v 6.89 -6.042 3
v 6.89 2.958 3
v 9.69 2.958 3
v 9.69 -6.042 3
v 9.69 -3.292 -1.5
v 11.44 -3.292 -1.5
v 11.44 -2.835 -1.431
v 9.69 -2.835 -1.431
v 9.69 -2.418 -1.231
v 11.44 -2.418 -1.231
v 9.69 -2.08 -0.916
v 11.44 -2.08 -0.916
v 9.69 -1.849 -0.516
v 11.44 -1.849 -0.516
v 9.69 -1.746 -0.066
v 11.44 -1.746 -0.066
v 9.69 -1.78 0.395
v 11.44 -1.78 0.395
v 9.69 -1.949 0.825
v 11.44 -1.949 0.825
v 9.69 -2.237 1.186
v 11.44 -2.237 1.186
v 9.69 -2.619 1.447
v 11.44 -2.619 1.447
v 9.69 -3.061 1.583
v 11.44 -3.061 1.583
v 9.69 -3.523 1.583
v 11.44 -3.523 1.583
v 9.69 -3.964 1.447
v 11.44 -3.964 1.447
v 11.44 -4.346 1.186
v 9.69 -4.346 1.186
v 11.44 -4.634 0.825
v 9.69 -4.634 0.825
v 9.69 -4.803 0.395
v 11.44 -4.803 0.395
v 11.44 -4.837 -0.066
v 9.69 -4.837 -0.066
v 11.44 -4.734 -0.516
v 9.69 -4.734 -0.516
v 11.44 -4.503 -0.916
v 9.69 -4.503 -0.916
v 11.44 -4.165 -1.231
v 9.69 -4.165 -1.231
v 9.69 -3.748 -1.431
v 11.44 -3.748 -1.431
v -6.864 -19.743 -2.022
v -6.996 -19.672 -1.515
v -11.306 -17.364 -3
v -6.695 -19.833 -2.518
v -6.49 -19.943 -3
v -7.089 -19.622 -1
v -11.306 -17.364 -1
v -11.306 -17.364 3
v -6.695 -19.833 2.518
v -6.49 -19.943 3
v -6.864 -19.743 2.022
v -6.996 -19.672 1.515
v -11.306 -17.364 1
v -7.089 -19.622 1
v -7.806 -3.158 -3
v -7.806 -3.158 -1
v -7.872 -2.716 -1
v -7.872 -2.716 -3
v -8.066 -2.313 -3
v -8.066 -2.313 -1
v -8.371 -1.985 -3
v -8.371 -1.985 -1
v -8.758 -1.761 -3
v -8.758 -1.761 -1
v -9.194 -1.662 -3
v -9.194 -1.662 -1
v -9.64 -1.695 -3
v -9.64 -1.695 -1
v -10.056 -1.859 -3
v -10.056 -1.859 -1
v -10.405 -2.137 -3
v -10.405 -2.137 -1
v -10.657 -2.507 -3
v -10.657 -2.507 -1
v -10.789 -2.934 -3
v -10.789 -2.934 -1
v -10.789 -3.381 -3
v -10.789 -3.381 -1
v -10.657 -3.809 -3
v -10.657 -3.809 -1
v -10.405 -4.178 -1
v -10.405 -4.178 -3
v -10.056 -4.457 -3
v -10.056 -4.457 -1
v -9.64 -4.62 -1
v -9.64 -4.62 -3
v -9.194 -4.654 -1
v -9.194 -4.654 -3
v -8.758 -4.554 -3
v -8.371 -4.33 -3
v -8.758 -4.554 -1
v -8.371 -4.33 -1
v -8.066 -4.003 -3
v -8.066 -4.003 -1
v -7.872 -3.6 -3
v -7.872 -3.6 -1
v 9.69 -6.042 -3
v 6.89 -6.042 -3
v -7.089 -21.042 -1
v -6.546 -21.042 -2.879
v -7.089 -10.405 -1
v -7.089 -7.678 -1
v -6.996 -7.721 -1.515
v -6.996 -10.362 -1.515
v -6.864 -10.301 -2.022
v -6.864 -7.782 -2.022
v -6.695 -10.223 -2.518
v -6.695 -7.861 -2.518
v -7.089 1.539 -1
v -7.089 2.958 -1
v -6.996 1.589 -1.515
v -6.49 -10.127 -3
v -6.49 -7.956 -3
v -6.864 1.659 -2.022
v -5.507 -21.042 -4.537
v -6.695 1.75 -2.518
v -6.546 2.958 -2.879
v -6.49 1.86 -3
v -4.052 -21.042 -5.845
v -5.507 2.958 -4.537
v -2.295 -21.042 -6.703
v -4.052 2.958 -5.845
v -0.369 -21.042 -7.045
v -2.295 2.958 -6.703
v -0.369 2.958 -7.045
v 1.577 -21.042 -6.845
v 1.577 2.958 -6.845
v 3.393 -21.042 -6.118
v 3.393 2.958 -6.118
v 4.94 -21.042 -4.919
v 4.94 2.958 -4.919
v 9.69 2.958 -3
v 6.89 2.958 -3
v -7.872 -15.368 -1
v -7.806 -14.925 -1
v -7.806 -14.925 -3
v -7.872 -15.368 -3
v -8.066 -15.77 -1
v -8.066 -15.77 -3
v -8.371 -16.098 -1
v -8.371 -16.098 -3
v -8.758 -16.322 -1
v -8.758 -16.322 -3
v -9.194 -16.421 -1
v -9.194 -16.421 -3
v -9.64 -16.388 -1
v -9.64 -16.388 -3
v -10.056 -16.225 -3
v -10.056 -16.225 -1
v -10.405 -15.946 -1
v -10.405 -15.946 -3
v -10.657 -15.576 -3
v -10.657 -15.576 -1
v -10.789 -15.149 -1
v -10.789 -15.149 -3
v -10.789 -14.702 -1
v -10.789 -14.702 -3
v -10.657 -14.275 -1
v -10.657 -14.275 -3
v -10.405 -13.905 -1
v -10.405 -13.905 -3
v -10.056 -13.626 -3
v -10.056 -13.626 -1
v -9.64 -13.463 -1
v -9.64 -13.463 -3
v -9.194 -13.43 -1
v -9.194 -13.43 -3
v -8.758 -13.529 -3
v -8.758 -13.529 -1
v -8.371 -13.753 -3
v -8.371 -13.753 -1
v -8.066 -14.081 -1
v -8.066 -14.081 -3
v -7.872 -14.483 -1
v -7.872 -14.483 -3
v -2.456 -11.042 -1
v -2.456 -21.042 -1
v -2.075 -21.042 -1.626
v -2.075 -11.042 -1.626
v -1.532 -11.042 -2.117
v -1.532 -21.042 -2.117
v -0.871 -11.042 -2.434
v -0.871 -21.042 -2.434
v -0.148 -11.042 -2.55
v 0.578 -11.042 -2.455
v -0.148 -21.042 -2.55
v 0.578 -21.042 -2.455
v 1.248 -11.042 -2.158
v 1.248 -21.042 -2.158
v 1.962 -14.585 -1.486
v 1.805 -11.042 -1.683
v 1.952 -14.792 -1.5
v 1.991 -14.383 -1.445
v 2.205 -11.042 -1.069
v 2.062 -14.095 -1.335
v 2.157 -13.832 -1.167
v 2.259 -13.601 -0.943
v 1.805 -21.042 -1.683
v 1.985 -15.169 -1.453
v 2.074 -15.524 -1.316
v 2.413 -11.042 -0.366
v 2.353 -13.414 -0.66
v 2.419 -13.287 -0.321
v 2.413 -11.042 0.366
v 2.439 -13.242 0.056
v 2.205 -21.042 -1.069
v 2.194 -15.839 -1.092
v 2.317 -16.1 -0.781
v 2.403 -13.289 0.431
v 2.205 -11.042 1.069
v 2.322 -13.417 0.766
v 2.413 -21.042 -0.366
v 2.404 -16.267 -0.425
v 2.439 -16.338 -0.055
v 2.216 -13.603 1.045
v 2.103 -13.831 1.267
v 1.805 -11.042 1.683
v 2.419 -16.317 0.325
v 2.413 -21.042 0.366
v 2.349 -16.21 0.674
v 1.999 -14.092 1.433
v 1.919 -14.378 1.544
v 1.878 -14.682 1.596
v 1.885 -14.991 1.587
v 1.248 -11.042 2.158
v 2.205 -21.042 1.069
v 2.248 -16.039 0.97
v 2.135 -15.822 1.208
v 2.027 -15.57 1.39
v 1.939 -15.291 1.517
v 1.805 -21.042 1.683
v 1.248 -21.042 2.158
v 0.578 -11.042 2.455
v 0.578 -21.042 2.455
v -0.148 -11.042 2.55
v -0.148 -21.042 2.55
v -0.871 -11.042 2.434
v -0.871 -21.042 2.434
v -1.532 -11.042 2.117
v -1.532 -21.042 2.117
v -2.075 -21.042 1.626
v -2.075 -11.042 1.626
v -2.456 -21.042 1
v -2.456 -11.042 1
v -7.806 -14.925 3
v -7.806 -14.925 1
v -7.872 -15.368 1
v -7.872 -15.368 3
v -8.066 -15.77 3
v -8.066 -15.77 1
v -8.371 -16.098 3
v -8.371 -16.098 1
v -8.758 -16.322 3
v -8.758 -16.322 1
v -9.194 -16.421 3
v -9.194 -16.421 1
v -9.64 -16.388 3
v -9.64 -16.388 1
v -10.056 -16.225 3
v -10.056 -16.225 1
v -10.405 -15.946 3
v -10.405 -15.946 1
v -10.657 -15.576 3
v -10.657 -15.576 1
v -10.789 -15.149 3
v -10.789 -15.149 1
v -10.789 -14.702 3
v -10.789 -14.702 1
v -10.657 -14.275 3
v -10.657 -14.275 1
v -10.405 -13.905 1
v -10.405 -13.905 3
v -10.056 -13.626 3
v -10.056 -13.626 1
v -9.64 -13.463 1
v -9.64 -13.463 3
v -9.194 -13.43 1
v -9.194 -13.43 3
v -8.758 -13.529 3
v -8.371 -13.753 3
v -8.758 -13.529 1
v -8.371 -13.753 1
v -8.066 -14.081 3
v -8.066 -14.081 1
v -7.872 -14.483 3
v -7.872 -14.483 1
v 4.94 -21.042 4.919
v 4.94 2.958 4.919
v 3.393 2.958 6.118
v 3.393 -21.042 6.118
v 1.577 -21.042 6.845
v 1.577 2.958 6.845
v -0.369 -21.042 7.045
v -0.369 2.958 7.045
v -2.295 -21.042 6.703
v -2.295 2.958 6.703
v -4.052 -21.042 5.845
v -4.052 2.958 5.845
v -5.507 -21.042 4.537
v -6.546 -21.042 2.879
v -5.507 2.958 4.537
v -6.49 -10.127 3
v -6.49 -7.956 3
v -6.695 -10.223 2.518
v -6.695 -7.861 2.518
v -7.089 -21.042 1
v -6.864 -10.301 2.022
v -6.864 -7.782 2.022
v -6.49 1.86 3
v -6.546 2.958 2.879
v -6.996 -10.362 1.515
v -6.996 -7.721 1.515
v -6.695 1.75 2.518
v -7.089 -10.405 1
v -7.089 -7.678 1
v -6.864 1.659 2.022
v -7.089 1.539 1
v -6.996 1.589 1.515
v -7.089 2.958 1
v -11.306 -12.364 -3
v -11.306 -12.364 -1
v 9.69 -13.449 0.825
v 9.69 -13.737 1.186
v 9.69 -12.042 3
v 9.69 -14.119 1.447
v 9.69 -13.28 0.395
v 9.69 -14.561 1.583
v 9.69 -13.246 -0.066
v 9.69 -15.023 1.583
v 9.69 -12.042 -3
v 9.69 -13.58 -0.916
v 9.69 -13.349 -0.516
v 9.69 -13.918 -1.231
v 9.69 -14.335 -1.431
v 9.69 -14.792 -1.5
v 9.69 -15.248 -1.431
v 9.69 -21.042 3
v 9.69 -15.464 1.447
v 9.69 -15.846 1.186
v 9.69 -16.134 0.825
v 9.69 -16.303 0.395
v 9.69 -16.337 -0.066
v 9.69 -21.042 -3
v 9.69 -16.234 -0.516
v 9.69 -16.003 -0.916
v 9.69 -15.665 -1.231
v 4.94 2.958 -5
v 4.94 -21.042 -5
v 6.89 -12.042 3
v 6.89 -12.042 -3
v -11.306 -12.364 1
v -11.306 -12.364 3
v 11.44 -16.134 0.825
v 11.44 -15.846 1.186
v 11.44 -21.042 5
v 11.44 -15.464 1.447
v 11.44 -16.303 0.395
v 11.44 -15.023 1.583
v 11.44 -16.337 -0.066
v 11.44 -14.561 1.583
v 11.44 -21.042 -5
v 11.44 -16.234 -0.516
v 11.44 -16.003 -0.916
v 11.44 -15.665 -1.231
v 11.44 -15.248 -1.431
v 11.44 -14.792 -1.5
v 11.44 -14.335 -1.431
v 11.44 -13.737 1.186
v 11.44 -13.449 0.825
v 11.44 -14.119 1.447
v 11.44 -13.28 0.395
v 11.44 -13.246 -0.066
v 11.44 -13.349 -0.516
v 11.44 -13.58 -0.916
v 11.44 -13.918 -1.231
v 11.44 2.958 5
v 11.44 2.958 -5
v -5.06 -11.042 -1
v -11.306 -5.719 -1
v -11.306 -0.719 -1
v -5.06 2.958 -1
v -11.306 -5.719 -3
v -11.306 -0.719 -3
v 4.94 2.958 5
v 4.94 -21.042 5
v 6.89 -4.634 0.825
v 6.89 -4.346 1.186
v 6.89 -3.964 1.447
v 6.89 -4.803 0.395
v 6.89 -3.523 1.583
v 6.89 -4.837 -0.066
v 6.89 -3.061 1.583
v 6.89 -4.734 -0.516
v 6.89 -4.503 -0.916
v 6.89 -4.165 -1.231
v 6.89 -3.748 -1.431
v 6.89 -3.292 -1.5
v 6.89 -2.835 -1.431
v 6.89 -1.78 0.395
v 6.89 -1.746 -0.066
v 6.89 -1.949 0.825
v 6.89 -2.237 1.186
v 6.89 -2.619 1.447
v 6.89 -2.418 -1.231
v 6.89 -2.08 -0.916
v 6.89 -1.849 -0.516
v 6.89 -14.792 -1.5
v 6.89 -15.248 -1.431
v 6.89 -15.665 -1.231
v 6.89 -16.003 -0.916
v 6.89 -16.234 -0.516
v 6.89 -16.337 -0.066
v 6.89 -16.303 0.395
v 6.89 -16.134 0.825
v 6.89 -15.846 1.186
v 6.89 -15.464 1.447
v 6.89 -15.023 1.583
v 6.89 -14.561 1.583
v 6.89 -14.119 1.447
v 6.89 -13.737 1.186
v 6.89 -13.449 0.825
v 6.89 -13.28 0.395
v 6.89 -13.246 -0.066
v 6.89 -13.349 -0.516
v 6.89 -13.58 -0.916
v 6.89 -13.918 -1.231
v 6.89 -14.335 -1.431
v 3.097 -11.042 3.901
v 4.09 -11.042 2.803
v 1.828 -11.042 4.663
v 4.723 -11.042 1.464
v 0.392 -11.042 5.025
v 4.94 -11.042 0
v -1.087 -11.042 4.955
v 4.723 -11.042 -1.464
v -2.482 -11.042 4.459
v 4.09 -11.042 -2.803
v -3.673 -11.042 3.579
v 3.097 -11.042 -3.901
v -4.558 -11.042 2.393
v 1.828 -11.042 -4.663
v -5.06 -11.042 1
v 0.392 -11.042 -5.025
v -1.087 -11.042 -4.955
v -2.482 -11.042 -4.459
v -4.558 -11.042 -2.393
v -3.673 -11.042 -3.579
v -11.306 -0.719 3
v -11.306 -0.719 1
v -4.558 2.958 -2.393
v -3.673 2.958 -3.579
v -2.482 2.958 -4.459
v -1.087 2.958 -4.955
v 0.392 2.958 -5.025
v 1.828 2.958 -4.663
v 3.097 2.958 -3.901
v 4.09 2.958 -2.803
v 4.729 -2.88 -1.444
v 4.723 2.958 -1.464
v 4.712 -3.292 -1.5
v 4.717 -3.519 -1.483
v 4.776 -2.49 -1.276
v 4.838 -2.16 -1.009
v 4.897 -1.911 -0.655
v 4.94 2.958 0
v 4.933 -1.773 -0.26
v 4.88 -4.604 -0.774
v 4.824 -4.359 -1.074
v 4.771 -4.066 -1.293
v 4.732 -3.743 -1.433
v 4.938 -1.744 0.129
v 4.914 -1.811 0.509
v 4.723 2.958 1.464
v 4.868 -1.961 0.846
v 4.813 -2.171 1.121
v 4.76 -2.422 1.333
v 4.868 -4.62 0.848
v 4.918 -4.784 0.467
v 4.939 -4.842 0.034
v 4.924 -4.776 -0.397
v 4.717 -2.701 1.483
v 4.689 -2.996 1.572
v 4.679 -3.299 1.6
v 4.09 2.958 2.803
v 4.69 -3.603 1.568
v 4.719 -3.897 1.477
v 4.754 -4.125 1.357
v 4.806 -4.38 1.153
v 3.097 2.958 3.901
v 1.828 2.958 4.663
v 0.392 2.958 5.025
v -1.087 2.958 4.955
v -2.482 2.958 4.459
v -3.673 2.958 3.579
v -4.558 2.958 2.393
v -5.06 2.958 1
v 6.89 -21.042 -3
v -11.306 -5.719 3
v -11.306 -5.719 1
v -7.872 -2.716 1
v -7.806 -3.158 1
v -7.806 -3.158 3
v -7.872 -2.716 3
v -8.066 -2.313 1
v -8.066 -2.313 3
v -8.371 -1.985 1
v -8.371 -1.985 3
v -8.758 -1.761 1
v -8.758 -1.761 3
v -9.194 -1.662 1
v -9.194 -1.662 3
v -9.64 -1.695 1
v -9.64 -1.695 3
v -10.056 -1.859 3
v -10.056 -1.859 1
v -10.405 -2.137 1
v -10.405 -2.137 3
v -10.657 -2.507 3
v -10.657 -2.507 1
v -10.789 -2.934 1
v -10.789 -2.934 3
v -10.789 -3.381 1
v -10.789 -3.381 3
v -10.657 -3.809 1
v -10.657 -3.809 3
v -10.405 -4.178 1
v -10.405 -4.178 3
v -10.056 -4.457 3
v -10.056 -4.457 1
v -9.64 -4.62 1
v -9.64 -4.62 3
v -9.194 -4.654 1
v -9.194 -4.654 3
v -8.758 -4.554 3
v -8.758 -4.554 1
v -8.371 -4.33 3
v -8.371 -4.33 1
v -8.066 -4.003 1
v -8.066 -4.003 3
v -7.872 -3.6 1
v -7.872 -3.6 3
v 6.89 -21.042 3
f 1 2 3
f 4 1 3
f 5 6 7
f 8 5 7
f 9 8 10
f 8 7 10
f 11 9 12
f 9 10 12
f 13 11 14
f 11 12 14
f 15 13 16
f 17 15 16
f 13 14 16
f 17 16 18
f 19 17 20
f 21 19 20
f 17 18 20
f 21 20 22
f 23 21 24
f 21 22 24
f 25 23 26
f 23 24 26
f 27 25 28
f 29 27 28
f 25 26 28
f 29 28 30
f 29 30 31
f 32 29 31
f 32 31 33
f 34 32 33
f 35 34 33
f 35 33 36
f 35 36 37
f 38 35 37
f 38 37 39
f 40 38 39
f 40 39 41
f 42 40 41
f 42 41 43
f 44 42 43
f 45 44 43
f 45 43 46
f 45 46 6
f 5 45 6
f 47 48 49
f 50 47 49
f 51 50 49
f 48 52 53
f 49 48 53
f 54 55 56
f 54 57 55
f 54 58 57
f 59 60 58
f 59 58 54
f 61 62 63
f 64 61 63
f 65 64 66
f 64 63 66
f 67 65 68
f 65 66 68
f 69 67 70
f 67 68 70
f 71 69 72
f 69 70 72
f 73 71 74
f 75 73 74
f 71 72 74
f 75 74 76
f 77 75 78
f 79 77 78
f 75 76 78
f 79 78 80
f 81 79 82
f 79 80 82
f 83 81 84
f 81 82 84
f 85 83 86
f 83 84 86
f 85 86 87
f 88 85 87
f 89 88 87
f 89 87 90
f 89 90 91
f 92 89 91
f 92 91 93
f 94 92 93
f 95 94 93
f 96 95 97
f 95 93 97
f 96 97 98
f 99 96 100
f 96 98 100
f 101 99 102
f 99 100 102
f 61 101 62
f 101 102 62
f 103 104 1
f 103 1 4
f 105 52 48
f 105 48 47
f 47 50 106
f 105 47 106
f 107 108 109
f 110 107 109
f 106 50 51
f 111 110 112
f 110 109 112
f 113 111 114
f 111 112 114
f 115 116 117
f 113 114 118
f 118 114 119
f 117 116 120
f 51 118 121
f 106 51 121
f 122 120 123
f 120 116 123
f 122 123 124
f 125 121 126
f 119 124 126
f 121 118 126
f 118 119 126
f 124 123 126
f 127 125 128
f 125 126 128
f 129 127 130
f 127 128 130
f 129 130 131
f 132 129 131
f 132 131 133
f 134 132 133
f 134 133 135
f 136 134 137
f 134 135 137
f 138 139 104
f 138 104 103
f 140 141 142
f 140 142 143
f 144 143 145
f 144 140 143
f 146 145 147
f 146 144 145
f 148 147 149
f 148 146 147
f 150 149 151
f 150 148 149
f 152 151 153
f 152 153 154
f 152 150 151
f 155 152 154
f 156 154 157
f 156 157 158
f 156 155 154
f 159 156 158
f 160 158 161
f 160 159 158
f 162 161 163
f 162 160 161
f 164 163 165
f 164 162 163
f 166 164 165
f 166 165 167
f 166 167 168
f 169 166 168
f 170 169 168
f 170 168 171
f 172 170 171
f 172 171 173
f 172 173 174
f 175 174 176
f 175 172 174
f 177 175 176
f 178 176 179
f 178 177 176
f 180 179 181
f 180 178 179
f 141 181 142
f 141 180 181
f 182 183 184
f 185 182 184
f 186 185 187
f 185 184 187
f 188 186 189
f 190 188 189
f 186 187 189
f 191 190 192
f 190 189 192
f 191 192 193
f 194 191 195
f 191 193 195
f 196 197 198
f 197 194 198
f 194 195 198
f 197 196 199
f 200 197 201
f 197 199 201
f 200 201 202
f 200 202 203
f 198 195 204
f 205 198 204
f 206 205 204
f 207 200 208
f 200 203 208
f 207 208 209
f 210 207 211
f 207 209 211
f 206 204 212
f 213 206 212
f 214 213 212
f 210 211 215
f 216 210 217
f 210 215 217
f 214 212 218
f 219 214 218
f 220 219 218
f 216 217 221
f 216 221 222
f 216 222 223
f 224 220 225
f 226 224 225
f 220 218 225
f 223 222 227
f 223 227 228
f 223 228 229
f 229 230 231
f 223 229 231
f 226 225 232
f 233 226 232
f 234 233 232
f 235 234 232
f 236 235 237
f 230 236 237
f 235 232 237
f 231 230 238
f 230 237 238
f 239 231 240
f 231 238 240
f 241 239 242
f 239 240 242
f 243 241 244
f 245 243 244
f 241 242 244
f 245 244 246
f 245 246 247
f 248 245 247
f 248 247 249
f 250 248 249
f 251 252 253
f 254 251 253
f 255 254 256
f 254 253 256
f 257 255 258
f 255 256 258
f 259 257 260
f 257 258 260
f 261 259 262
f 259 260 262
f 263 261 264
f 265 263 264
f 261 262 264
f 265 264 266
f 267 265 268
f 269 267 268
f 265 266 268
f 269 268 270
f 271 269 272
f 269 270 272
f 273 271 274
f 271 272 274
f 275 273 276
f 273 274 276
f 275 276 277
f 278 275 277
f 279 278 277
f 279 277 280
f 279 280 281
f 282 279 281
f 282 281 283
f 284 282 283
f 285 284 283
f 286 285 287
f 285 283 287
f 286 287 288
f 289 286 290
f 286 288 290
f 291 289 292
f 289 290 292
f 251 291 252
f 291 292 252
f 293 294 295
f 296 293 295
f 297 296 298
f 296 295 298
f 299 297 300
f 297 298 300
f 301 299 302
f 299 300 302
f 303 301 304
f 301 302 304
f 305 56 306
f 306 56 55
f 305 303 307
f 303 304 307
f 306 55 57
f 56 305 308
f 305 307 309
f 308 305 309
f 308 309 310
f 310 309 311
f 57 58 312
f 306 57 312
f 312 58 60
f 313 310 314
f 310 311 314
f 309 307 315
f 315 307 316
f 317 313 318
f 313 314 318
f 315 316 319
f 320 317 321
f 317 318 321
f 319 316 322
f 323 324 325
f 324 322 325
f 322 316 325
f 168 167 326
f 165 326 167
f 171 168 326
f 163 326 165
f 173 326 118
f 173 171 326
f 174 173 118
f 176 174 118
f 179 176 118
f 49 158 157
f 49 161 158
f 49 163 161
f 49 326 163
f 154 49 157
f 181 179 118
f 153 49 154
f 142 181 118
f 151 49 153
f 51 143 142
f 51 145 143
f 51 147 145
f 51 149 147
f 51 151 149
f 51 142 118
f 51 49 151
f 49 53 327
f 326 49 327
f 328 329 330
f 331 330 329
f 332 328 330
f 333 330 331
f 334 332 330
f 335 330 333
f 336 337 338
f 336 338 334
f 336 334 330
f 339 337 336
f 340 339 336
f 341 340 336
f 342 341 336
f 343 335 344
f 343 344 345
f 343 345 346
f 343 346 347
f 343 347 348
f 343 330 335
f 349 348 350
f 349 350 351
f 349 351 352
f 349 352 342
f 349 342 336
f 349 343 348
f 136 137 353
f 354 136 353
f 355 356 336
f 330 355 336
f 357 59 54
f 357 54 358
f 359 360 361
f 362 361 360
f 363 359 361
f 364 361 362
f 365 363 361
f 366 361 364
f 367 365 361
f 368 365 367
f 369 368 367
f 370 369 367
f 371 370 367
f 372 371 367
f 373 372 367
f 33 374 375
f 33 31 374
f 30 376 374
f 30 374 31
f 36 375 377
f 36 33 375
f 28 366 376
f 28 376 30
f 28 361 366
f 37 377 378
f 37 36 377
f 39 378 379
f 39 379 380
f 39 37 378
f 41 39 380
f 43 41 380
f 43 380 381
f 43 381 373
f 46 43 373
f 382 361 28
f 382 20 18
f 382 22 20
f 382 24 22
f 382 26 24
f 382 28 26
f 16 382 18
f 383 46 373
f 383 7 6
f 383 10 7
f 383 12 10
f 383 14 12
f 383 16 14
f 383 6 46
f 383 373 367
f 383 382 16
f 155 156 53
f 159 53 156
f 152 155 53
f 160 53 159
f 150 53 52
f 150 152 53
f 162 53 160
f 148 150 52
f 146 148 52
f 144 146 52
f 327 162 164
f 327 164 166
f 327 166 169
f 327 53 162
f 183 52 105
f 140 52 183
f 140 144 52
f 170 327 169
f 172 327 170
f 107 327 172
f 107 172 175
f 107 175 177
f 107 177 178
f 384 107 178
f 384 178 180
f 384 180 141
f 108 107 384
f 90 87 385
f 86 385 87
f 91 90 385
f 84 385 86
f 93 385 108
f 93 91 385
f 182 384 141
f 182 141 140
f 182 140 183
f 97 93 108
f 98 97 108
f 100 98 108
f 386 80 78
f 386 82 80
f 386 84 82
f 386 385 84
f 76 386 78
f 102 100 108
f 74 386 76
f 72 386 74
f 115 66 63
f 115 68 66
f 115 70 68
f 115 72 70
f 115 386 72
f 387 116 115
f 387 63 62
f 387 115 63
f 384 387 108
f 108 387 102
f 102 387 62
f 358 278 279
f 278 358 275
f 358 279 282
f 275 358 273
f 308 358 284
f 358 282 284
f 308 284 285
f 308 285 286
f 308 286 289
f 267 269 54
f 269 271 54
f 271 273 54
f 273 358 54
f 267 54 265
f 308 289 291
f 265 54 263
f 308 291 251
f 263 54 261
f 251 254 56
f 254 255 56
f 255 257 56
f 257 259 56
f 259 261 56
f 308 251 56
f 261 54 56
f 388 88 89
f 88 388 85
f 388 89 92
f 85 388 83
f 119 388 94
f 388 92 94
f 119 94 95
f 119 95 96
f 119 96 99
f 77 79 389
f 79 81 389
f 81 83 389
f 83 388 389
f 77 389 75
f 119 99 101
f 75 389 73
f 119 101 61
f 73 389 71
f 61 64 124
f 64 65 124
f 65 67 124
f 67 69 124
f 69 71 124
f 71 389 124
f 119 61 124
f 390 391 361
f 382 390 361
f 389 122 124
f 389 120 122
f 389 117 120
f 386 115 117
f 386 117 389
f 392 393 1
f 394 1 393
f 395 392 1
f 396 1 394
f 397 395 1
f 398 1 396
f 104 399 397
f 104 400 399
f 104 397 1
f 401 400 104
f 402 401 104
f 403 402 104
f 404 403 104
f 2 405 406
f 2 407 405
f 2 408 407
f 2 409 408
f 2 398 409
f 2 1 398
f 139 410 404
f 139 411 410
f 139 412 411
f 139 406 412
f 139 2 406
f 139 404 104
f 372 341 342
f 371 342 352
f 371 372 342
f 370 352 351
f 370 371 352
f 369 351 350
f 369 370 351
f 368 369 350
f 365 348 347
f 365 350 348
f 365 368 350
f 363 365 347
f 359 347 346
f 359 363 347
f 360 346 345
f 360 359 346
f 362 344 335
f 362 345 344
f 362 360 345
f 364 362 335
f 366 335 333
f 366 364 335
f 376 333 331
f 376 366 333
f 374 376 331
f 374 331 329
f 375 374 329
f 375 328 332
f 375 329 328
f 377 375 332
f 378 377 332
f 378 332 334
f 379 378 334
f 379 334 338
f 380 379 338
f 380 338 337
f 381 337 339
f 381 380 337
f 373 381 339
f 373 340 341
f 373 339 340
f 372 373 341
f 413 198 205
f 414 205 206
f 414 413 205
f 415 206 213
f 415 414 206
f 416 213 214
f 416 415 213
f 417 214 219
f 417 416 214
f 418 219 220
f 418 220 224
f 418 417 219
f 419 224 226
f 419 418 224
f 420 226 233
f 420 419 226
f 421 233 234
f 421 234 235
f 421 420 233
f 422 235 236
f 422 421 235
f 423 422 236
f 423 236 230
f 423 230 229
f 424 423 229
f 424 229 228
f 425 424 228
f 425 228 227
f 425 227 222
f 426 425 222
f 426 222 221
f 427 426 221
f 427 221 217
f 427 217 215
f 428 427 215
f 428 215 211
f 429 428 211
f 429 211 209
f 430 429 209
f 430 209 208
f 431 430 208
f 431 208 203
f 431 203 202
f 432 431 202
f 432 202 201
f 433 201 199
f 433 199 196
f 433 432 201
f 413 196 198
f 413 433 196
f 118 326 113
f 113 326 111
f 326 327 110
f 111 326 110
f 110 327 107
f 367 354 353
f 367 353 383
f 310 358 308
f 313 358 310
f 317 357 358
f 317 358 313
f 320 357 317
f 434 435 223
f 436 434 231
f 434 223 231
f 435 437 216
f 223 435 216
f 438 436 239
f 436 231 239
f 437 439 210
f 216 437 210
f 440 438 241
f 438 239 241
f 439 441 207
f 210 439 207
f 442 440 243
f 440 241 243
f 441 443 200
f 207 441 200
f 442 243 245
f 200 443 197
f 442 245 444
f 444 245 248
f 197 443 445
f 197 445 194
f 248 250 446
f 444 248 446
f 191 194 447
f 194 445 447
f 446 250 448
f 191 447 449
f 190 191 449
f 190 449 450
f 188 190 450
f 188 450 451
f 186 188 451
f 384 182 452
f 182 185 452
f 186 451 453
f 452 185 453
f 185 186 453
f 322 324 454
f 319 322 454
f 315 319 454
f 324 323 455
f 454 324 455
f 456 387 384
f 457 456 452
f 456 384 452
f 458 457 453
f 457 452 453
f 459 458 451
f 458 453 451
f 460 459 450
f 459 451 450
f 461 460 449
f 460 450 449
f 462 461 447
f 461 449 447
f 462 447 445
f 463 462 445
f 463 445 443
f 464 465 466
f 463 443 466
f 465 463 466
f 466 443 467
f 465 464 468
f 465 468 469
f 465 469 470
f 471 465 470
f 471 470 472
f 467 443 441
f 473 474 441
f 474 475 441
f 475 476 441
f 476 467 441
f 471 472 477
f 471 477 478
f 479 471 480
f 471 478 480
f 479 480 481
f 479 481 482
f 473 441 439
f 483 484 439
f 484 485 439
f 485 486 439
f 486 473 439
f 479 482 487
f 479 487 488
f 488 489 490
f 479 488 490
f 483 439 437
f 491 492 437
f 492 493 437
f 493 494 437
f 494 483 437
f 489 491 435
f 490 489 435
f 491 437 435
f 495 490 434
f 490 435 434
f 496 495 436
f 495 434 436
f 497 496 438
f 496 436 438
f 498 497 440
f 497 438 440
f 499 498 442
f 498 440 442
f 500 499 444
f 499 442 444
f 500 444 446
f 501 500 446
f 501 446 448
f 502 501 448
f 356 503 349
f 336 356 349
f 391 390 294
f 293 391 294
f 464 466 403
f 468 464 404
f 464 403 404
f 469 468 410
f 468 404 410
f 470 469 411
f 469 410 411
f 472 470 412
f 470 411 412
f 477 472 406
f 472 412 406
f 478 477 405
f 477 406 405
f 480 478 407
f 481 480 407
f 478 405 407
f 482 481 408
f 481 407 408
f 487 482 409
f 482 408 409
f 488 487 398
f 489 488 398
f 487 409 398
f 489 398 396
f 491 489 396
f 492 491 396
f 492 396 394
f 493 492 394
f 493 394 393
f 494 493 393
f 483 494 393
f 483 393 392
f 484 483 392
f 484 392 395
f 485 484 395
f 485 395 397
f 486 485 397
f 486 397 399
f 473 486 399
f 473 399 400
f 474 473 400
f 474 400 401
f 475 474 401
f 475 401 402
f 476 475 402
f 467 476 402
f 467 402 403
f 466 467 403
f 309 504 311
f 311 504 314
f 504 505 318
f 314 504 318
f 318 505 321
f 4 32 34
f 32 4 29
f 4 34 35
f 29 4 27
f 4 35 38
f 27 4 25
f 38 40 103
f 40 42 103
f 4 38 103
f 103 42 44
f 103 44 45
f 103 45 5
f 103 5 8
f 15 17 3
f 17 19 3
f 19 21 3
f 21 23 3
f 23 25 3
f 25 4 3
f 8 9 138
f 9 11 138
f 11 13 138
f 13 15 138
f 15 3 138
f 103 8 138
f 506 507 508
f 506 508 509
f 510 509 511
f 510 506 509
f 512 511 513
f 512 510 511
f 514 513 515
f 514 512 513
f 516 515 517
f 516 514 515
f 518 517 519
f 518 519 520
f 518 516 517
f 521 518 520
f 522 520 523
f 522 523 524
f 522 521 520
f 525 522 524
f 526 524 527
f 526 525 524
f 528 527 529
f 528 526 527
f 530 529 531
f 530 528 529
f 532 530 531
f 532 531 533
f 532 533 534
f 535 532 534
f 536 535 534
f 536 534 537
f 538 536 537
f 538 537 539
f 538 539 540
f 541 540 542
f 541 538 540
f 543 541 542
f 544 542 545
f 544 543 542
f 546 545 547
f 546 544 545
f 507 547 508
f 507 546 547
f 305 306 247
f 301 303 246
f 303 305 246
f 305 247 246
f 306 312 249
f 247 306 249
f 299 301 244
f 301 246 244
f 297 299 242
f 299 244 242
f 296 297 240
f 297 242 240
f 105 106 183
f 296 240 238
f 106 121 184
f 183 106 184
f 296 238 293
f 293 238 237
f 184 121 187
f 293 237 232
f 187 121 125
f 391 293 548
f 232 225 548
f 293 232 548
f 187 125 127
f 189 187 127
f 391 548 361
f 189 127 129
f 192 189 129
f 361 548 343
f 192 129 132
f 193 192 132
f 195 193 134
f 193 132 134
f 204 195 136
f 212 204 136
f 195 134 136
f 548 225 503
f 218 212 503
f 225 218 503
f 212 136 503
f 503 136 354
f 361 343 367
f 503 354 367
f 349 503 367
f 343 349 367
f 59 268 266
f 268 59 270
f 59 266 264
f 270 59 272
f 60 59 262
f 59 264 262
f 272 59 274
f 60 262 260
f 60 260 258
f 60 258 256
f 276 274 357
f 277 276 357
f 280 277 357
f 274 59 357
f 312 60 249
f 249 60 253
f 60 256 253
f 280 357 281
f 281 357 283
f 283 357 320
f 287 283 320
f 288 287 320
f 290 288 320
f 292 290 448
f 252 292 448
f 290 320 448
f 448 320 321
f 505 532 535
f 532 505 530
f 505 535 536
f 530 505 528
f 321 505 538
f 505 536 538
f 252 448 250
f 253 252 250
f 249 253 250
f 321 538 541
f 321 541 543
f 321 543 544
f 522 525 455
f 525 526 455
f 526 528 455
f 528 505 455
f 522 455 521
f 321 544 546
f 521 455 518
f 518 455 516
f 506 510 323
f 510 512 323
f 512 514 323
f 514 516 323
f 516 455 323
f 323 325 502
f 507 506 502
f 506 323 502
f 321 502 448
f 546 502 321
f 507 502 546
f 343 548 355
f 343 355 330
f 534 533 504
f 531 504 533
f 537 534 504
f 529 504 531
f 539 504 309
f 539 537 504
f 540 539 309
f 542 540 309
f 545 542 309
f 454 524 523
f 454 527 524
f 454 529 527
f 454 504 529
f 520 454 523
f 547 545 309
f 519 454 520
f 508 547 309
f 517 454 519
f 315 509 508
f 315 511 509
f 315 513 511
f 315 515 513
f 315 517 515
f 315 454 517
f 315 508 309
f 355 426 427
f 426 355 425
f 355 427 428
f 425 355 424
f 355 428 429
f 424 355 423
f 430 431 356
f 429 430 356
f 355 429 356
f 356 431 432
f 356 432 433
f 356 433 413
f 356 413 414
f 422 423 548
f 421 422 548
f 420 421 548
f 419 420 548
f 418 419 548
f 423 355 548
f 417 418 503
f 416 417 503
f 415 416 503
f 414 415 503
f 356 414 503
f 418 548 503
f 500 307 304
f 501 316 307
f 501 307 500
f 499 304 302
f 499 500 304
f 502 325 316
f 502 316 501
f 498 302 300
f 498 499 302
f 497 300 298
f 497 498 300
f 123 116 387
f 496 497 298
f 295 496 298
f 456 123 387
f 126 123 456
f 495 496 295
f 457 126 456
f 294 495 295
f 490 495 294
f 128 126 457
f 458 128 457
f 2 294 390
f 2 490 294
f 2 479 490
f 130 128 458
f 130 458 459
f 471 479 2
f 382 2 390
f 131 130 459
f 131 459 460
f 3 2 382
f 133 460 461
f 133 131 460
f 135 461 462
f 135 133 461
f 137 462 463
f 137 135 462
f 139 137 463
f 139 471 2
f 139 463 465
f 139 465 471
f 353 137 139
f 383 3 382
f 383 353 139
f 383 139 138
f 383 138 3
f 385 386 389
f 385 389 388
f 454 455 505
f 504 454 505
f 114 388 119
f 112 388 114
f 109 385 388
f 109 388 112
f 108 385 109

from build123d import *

# Parameters (mm, degrees)
SKETCH2_W               = 6.825797408
SKETCH2_H               = 2
CUT_EXTRUDE1_DEPTH      = 25
SKETCH3_R               = 1.5
BOSS_EXTRUDE1_DEPTH     = 2
SKETCH4_W               = 6.5
SKETCH4_H               = 10
BOSS_EXTRUDE2_DEPTH     = 24
SKETCH5_W               = 2.8
SKETCH5_H               = 6
CUT_EXTRUDE2_DEPTH      = 9
SKETCH6_R               = 1.55
CUT_EXTRUDE3_DEPTH      = 10
MIRROR4_COPY_1_SKETCH_R = 1.5
MIRROR4_COPY_1_DEPTH    = 2


with BuildPart() as part:
    # Sketch1 → Revolve1 (revolve)
    with BuildSketch(Plane.XY):
        Polygon((-2.660447761, -21.041604478), (-7.160447761, -21.041604478), (-7.160447761, 2.958395522), (-5.160447761, 2.958395522), (-5.160447761, -11.041604478), (-2.660447761, -11.041604478), align=None)
    revolve(axis=Axis((-0.110447761, 2.958395522, 0), (0, -1, 0)))

    # Sketch2 → Cut-Extrude1 (cut, through all)
    with BuildSketch(Plane(origin=(0, 2.958395522, 0), x_dir=(1, 0, 0), z_dir=(0, 1, 0))):
        with Locations((-5.160447761, 0)):
            Rectangle(SKETCH2_W, SKETCH2_H)
    extrude(amount=-CUT_EXTRUDE1_DEPTH, mode=Mode.SUBTRACT)

    # Sketch3 → Boss-Extrude1 (add)
    with BuildSketch(Plane.XY.offset(-1)):
        Polygon((-6.305854072, 1.958395522), (-11.305854072, -0.719474979), (-11.305854072, -5.719474979), (-6.305854072, -8.041604478), align=None)
        with Locations((-9.305854072, -3.157710953)):
            Circle(SKETCH3_R, mode=Mode.SUBTRACT)
    boss_extrude1 = extrude(amount=-BOSS_EXTRUDE1_DEPTH)

    # Mirror1: Boss-Extrude1 across plane
    add(boss_extrude1.mirror(Plane.XY))

    # Sketch4 → Boss-Extrude2 (add, through all)
    with BuildSketch(Plane(origin=(0, 2.958395522, 0), x_dir=(1, 0, 0), z_dir=(0, 1, 0))):
        with Locations((8.189552239, 0)):
            Rectangle(SKETCH4_W, SKETCH4_H)
    extrude(amount=-BOSS_EXTRUDE2_DEPTH)

    # Sketch5 → Cut-Extrude2 (cut)
    with BuildSketch(Plane(origin=(0, 2.958395522, 0), x_dir=(1, 0, 0), z_dir=(0, 1, 0))):
        with Locations((8.289552239, 0)):
            Rectangle(SKETCH5_W, SKETCH5_H)
    cut_extrude2 = extrude(amount=-CUT_EXTRUDE2_DEPTH, mode=Mode.SUBTRACT)

    # Mirror2: Cut-Extrude2 across plane
    add(cut_extrude2.mirror(Plane.ZX.offset(-9.041604478)), mode=Mode.SUBTRACT)

    # Sketch6 → Cut-Extrude3 (cut)
    with BuildSketch(Plane(origin=(11.439552239, 0, 0), x_dir=(0, 0, -1), z_dir=(1, 0, 0))):
        with Locations((-0.05, -3.291604478)):
            Circle(SKETCH6_R)
    cut_extrude3 = extrude(amount=-CUT_EXTRUDE3_DEPTH, mode=Mode.SUBTRACT)

    # Mirror3: Cut-Extrude3 across plane
    add(cut_extrude3.mirror(Plane.ZX.offset(-9.041604478)), mode=Mode.SUBTRACT)

    # Mirror4: Boss-Extrude1 across plane
    add(boss_extrude1.mirror(Plane.ZX.offset(-9.041604478)))

    # Mirror4 copy 1 sketch → Mirror4 copy 1 (add)
    with BuildSketch(Plane(origin=(0, -18.083208955, 1), x_dir=(1, 0, 0), z_dir=(0, 0, -1))):
        Polygon((-6.305854072, 1.958395522), (-11.305854072, -0.719474979), (-11.305854072, -5.719474979), (-6.305854072, -8.041604478), align=None)
        with Locations((-9.305854072, -3.157710953)):
            Circle(MIRROR4_COPY_1_SKETCH_R, mode=Mode.SUBTRACT)
    extrude(amount=-MIRROR4_COPY_1_DEPTH)


solid = part.part
